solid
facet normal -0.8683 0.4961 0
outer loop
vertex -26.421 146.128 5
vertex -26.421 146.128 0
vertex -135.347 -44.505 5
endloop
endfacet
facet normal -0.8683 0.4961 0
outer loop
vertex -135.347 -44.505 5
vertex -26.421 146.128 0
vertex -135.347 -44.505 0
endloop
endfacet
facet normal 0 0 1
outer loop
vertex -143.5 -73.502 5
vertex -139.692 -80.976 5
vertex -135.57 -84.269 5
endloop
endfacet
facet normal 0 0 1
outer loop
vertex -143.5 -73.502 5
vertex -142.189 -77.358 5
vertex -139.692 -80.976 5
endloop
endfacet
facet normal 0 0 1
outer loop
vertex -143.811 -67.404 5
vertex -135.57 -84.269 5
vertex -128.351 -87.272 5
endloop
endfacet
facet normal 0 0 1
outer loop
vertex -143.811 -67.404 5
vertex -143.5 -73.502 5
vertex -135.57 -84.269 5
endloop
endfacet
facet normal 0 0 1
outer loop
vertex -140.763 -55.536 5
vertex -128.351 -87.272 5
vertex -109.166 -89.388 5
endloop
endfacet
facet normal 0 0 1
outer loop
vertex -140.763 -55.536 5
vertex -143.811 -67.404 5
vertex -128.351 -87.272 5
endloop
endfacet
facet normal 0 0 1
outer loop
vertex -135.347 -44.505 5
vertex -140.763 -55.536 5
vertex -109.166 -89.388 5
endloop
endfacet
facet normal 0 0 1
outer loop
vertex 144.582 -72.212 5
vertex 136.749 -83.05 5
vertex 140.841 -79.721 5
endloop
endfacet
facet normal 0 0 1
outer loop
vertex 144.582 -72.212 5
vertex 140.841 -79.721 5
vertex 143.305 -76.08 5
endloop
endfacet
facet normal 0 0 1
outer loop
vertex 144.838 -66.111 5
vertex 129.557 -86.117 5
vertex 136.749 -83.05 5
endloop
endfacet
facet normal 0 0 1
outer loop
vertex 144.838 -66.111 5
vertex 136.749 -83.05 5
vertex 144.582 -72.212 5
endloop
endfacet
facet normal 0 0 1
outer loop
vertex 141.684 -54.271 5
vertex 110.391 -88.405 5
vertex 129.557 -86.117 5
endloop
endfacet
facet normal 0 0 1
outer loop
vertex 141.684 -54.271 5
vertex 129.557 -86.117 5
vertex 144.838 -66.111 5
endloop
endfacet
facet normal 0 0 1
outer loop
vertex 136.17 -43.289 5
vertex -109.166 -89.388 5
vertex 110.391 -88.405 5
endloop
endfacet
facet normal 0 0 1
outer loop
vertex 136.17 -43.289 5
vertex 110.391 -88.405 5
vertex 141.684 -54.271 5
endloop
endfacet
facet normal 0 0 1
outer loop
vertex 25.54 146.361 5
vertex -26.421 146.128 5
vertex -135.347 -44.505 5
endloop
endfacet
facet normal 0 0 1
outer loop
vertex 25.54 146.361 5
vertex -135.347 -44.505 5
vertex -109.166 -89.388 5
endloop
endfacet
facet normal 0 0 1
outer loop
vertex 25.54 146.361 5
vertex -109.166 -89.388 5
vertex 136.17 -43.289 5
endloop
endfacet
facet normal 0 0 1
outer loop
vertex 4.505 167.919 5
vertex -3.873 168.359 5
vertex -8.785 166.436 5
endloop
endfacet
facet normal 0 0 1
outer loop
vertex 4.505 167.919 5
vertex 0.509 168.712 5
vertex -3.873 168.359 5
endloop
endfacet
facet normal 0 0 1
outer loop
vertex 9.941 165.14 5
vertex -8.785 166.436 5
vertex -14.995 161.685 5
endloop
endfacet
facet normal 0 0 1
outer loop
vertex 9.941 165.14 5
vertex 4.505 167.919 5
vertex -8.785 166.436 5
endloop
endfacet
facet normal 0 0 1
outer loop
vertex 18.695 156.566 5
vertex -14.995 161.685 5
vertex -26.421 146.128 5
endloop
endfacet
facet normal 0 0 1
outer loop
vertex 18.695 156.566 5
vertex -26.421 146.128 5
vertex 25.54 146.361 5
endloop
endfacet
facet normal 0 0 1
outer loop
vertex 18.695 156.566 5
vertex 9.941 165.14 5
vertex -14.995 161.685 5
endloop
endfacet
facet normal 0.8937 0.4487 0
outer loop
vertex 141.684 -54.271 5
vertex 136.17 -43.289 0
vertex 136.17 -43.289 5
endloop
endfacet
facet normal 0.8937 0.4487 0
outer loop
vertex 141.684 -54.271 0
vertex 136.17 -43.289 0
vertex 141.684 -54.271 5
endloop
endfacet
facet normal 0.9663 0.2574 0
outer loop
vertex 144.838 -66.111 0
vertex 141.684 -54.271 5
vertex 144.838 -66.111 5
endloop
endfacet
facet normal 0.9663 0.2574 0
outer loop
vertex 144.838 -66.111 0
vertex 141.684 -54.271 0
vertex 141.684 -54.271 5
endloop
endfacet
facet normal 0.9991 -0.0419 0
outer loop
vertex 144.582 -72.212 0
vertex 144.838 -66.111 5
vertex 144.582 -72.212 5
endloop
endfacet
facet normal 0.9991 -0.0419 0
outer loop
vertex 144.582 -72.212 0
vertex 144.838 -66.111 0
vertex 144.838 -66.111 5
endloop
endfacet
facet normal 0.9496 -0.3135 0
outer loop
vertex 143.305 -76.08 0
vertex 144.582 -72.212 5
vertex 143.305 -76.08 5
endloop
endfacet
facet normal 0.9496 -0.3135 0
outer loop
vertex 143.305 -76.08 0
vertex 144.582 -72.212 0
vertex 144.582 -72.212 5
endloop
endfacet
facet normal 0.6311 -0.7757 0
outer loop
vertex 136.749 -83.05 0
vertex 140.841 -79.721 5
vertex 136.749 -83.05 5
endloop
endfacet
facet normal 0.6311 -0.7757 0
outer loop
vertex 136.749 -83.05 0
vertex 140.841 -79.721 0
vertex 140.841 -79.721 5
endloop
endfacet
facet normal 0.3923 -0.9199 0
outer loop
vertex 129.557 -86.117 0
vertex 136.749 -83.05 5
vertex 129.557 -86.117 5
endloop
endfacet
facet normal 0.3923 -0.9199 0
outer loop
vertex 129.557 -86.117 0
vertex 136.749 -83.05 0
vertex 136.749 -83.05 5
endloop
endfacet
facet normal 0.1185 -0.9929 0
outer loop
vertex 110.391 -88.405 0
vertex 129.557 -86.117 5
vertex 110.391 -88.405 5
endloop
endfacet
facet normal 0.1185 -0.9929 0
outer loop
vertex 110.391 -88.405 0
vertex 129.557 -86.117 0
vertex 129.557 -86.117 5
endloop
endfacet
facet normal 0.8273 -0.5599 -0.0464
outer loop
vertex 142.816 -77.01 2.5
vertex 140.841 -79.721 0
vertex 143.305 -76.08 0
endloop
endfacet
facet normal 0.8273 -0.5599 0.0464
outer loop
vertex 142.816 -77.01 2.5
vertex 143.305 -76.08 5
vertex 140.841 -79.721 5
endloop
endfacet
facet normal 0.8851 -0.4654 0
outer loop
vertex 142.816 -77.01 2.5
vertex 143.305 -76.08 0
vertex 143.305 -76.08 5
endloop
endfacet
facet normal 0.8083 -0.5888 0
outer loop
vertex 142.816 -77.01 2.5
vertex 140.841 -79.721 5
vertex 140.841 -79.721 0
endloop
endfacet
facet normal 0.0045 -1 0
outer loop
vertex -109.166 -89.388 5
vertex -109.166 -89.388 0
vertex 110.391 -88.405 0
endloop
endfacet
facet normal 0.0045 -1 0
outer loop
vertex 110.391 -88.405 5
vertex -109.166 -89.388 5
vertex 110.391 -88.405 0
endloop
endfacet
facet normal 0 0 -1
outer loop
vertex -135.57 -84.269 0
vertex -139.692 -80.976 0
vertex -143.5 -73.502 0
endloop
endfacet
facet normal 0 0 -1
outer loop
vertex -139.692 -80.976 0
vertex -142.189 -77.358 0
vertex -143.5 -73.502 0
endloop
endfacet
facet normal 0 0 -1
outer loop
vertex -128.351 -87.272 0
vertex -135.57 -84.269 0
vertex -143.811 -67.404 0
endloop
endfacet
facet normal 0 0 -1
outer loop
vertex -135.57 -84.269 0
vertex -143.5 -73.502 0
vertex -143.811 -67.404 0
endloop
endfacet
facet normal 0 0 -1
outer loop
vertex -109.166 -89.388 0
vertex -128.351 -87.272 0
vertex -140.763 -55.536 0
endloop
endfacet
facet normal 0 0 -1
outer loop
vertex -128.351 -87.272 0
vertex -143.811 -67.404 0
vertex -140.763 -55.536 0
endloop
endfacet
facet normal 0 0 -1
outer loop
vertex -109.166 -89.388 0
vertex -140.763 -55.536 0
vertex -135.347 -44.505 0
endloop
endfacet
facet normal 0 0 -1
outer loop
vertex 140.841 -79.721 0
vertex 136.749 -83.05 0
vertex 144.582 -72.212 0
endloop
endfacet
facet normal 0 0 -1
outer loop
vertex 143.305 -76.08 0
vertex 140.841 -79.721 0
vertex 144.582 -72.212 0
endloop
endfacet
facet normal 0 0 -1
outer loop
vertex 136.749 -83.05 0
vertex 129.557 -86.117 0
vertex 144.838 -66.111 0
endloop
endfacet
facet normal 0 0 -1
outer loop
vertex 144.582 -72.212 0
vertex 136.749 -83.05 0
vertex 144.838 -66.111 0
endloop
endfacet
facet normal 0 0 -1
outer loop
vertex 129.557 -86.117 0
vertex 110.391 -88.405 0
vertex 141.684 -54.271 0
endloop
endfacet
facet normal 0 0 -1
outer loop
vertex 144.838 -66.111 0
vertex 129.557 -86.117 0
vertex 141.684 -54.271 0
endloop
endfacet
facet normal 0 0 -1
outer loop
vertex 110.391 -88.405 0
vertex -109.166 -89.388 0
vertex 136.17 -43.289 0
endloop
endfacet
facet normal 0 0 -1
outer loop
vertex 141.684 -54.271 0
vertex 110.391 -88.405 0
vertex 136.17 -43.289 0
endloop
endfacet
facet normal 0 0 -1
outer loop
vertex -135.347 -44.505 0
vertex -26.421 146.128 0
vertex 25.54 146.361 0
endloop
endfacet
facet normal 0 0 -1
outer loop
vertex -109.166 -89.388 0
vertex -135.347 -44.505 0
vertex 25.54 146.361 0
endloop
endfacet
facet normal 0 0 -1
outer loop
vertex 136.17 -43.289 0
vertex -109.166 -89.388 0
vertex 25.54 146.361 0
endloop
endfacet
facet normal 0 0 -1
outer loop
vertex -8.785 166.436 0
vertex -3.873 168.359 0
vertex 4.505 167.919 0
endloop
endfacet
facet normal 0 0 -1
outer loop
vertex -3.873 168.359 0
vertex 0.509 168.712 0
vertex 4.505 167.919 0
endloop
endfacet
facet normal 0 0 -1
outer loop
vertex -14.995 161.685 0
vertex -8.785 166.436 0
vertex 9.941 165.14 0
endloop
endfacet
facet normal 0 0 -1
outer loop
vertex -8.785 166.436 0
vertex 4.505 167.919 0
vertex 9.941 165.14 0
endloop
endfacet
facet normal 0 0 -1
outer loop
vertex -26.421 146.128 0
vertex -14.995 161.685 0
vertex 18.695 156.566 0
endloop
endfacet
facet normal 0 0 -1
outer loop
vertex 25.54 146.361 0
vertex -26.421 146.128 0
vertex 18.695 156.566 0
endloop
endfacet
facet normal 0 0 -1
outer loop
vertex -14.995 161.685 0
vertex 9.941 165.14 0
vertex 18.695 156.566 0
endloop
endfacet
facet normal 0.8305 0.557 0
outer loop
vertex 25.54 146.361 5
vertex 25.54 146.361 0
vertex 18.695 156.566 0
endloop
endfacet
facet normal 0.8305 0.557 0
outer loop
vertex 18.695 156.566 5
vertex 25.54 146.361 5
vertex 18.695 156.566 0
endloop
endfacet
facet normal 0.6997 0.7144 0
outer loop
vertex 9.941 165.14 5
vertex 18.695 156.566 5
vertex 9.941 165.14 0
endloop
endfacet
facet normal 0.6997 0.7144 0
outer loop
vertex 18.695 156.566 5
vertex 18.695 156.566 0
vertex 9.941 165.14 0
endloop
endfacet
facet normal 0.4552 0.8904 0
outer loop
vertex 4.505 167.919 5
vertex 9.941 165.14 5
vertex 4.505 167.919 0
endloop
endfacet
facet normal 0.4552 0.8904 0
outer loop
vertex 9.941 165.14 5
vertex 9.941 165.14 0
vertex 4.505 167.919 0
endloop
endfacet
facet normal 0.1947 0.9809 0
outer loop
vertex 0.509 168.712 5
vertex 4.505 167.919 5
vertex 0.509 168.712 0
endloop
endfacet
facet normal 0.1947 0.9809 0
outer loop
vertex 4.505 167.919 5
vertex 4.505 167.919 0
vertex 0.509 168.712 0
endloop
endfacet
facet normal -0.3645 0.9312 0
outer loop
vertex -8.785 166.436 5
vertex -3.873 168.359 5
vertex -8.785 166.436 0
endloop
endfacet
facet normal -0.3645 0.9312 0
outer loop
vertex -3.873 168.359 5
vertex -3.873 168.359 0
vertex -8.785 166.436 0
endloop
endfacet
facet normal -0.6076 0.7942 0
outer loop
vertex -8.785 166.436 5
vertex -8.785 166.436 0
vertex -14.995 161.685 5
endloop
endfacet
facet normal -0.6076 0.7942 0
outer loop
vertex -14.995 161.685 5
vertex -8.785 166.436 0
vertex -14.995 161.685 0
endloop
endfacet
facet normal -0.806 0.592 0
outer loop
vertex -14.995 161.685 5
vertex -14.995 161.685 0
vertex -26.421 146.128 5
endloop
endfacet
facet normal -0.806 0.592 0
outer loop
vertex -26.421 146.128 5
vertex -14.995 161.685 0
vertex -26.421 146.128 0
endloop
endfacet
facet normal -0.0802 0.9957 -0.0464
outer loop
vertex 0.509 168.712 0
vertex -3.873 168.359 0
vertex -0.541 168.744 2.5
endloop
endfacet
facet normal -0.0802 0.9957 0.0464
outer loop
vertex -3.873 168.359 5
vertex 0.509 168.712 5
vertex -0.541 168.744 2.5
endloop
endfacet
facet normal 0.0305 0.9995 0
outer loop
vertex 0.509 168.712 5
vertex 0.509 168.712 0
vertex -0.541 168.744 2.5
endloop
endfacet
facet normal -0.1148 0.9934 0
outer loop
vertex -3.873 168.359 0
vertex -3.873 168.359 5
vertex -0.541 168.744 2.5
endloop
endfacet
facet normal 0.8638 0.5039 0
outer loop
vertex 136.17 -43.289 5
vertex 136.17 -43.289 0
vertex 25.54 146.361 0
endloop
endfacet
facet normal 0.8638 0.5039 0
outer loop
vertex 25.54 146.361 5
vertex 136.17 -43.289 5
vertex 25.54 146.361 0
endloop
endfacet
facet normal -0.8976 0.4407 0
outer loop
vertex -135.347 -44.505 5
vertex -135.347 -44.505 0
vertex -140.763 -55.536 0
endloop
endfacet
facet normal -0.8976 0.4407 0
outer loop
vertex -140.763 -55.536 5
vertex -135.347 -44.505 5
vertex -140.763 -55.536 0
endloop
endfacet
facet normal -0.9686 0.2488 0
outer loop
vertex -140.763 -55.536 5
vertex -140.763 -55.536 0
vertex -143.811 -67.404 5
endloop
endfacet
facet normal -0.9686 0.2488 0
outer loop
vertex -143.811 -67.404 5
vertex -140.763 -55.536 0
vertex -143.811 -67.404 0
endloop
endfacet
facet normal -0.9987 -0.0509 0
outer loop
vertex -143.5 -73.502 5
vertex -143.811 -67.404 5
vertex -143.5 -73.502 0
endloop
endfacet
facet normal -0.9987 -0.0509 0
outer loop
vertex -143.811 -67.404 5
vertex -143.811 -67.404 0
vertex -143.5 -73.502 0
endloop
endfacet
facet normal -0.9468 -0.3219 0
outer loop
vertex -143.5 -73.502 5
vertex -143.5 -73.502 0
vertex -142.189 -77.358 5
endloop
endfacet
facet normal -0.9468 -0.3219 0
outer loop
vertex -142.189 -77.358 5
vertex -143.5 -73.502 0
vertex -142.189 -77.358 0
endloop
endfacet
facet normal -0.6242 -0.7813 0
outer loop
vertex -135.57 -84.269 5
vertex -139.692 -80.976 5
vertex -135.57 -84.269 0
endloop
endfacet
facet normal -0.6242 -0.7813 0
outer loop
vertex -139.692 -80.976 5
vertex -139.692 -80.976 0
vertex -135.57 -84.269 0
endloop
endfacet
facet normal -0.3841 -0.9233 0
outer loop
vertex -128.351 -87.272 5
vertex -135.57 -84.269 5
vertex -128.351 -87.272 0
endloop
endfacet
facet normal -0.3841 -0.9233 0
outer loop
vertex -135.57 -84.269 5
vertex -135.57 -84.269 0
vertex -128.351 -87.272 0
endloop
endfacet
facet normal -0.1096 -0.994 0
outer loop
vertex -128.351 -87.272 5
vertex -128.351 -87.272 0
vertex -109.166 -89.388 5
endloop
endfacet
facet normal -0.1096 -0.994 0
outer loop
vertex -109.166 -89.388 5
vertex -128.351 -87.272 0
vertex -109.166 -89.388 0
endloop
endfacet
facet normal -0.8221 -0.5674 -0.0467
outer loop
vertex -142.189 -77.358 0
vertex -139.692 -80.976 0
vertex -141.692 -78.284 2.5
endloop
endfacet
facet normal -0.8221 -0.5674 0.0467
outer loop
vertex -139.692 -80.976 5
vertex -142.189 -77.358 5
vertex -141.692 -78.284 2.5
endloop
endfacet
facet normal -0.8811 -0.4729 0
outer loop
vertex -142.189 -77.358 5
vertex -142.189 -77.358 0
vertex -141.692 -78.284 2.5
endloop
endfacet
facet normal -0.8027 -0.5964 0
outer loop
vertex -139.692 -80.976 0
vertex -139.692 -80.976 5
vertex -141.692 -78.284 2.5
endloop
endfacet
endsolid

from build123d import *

# Parameters (mm, degrees)
F1_DEPTH    = 5
F2_T1_DEPTH = 264.8076211353


# Not quite as in the source:
# - a fillet or chamfer that OpenCascade refuses, or shapes differently, is made with other operations: its cross-section is extruded or revolved along the edge and cut away or added


with BuildPart() as f1:
    # F0 (on Top) → F1 (new body)
    with BuildSketch(Plane.XY):
        Polygon((-0.6416016338, 191.2437425446), (-161.12652421, -89.6207541227), (162.3517262131, -88.1725256644), align=None)
    extrude(amount=F1_DEPTH)

    # F2: fillet of radius 30 on 3 edges, made by hand

    # F2_s2 → F2_t1 (cut)
    with BuildSketch(Plane.XY.offset(-129.9038105677)):
        with BuildLine():
            add(Edge.make_bspline(
                [(25.5403653575, 146.3605095453), (-0.6416016338, 191.2437425446), (-26.4206381195, 146.1278775095)],
                knots=[0, 0, 0, 1, 1, 1], degree=2, weights=[1, 1, 1]))
            Line((-26.4206381195, 146.1278775095), (-0.6416016338, 191.2437425446))
            Line((-0.6416016338, 191.2437425446), (25.5403653575, 146.3605095453))
        make_face()
        with BuildLine():
            add(Edge.make_bspline(
                [(-135.3474877243, -44.5048890876), (-161.12652421, -89.6207541227), (-109.165520733, -89.3881220869)],
                knots=[0, 0, 0, 1, 1, 1], degree=2, weights=[1, 1, 1]))
            Line((-109.165520733, -89.3881220869), (-161.12652421, -89.6207541227))
            Line((-161.12652421, -89.6207541227), (-135.3474877243, -44.5048890876))
        make_face()
        with BuildLine():
            add(Edge.make_bspline(
                [(136.1697592218, -43.2892926651), (162.3517262131, -88.1725256644), (110.3907227362, -88.4051577003)],
                knots=[0, 0, 0, 1, 1, 1], degree=2, weights=[1, 1, 1]))
            Line((110.3907227362, -88.4051577003), (162.3517262131, -88.1725256644))
            Line((162.3517262131, -88.1725256644), (136.1697592218, -43.2892926651))
        make_face()
    extrude(amount=F2_T1_DEPTH, mode=Mode.SUBTRACT)


solid = f1.part
